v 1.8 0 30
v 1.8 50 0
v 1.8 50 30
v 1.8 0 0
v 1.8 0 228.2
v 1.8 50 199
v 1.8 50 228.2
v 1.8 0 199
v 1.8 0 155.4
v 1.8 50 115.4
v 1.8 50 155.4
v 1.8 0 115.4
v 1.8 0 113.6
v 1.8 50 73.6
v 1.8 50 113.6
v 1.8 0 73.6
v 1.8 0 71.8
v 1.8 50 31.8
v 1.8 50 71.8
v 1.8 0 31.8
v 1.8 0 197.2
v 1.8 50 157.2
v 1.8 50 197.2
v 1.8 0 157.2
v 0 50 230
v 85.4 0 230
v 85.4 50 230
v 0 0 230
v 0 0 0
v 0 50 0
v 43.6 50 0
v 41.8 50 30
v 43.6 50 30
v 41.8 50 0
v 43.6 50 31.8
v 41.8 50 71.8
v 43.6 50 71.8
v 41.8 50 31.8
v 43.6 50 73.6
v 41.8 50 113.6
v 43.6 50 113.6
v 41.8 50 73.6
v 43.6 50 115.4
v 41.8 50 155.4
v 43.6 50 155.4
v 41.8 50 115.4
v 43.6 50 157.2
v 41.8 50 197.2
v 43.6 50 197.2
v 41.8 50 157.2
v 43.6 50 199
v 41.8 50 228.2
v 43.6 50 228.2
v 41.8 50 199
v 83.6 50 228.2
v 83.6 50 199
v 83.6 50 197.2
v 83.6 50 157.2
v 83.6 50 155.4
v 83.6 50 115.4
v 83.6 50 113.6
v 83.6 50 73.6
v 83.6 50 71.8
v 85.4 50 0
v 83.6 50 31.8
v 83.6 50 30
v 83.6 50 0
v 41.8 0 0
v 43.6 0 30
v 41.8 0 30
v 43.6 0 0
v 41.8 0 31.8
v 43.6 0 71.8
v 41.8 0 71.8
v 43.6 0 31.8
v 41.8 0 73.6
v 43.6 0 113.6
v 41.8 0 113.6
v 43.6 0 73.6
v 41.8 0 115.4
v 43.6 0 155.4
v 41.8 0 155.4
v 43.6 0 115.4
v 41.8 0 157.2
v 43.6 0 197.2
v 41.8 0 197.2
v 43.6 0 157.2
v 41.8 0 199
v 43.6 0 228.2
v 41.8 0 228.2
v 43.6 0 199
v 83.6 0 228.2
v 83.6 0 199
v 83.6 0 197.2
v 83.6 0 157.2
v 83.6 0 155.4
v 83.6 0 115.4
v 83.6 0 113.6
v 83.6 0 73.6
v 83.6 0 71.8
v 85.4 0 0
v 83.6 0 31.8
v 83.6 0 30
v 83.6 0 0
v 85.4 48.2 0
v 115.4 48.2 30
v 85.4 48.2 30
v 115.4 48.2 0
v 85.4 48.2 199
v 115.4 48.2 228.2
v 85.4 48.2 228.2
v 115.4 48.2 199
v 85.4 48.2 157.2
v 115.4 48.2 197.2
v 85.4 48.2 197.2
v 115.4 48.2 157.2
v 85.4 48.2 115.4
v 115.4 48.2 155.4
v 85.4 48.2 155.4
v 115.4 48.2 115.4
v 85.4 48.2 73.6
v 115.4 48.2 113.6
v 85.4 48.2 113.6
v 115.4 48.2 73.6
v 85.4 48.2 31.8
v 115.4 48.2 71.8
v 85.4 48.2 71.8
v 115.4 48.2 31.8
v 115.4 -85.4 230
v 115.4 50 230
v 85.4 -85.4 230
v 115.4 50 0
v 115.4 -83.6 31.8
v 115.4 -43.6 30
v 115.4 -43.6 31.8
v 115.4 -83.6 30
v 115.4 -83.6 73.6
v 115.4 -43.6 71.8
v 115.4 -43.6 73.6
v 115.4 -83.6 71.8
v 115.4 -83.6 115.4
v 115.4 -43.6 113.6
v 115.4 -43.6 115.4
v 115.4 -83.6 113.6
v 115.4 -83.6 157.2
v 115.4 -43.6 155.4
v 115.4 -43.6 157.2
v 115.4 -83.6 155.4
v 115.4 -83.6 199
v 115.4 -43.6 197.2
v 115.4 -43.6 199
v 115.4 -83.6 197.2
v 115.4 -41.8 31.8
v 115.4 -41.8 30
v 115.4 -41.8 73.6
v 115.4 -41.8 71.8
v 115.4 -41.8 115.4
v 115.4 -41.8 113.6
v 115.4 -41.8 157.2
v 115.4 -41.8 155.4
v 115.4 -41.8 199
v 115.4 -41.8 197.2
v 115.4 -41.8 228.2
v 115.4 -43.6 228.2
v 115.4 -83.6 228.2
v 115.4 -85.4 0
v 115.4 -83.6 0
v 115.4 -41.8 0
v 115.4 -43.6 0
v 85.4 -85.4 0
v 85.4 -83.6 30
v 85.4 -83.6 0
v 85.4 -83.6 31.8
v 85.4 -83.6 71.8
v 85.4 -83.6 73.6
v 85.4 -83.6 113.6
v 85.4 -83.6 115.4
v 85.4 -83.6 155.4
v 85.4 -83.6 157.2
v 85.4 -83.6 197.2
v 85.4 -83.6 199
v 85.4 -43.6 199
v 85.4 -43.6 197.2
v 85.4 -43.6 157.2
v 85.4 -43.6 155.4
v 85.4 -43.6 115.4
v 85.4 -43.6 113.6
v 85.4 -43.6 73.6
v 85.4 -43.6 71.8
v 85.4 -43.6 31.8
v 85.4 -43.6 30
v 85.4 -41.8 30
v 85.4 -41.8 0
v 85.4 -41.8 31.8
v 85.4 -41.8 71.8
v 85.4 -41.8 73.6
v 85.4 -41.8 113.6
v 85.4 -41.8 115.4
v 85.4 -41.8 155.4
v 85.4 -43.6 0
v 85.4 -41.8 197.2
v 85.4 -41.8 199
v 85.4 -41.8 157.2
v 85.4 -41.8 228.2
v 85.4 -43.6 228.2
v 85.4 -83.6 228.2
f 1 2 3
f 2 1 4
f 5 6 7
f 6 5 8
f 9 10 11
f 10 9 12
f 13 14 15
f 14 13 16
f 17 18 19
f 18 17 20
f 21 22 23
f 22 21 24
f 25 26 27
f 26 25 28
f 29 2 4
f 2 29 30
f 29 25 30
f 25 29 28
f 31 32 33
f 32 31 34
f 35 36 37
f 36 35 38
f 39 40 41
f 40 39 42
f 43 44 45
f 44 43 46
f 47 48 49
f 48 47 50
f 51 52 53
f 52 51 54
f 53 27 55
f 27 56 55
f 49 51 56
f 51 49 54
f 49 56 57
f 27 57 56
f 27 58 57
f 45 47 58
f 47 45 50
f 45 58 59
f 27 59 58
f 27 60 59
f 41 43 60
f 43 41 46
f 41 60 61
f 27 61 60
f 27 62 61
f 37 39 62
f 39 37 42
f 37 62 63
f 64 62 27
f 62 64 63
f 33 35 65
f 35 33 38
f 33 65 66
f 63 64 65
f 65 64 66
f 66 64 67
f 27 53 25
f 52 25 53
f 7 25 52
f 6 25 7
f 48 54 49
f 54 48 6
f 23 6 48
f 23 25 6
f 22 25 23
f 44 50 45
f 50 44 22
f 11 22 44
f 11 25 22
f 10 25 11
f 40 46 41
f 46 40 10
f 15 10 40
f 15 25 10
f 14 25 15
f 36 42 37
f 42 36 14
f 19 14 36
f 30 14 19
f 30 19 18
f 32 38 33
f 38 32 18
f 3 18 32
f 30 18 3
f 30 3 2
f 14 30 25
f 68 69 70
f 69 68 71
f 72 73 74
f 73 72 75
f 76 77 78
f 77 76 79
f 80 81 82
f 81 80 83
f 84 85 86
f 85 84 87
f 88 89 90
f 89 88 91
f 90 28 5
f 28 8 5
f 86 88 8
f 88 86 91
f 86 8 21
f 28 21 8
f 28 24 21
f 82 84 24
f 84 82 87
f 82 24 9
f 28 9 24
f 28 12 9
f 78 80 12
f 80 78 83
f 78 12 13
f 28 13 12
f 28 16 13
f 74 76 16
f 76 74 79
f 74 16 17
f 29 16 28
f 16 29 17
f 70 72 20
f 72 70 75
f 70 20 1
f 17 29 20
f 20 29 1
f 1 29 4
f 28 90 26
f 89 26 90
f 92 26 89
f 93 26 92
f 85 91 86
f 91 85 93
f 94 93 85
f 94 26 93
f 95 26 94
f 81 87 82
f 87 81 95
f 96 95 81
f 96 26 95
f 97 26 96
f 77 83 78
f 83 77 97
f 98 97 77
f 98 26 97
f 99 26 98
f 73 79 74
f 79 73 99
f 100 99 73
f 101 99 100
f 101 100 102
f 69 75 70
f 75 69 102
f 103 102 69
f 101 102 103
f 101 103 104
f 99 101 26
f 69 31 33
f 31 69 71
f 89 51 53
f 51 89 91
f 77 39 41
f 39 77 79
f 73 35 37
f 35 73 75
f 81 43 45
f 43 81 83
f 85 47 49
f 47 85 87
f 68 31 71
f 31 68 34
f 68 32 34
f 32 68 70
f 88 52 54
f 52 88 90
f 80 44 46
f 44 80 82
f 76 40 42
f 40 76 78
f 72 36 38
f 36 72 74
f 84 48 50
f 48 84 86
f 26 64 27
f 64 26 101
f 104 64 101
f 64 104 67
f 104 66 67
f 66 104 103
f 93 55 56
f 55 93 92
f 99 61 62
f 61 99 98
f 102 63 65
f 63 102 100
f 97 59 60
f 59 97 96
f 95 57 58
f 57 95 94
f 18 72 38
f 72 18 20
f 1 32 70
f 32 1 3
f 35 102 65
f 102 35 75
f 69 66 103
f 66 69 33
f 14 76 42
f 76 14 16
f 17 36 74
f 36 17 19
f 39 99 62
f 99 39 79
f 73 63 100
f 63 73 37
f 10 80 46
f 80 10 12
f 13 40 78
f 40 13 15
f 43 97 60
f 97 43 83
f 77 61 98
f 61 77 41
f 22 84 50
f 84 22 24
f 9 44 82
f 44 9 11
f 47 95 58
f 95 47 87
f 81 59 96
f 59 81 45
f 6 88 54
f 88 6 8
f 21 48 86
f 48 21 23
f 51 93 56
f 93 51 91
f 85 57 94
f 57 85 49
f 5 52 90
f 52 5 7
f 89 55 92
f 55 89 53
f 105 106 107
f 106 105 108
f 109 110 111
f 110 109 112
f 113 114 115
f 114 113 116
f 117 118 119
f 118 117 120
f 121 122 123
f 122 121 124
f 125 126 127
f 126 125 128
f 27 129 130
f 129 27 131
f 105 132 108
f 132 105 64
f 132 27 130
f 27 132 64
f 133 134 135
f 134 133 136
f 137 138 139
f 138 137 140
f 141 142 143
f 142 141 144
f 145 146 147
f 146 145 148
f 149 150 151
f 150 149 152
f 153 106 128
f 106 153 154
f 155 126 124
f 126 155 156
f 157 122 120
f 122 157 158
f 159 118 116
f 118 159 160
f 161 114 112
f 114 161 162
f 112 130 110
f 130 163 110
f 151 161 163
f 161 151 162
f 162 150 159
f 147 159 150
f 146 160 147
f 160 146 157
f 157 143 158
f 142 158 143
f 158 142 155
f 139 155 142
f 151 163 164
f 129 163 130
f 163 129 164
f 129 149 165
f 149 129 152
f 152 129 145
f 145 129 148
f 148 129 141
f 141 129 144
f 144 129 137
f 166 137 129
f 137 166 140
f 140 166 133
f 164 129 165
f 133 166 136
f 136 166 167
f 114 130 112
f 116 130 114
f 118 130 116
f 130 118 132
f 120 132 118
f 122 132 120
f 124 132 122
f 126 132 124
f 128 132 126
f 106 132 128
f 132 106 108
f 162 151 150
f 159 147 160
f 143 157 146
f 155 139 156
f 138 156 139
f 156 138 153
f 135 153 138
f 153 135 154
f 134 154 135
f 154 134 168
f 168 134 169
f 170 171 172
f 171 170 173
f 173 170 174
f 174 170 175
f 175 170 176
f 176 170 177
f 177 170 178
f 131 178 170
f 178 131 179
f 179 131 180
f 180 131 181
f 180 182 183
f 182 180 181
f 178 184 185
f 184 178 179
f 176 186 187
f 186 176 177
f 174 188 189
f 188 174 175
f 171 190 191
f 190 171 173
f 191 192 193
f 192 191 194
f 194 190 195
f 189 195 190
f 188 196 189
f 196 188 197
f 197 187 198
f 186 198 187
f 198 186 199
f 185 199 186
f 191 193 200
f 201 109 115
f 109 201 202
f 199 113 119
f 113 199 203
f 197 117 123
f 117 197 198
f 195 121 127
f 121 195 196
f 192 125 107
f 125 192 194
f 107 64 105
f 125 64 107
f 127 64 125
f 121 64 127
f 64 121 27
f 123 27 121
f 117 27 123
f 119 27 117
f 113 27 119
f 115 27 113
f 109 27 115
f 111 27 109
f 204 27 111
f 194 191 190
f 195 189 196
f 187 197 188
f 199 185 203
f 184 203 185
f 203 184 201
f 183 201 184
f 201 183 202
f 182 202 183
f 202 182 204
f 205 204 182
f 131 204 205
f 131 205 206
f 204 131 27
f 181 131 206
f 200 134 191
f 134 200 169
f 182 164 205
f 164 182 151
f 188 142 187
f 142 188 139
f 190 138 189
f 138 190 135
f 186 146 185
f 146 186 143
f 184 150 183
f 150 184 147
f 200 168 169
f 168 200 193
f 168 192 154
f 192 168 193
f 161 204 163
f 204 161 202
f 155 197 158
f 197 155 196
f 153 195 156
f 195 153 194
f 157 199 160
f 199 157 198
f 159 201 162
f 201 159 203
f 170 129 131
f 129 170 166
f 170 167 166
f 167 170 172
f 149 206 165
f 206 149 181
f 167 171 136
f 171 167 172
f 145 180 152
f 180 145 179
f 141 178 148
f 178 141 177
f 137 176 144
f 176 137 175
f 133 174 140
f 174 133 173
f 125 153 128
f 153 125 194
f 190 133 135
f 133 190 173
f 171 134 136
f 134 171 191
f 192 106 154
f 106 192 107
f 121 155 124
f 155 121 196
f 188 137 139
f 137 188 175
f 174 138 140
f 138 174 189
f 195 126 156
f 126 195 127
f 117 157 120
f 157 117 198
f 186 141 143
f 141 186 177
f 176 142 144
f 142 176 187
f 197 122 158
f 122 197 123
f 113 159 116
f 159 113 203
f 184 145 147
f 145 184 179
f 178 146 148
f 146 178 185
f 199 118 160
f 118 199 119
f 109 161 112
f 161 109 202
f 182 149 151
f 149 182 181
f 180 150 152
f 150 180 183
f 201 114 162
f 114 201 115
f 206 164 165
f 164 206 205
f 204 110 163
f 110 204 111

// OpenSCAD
$fs=0.25;$fa=6;
color([0,1,0.251])union() {
union() {
union() {
translate([0.9,25,115])cube([1.8,50,230],center=true);
translate([42.7,25,115])cube([1.8,50,230],center=true);
translate([84.5,25,115])cube([1.8,50,230],center=true);
}
translate([42.7,25,229.1])cube([85.4,50,1.8],center=true);
union() {
translate([21.8,25,30.9])cube([40,50,1.8],center=true);
translate([63.6,25,30.9])cube([40,50,1.8],center=true);
translate([21.8,25,72.7])cube([40,50,1.8],center=true);
translate([63.6,25,72.7])cube([40,50,1.8],center=true);
translate([21.8,25,114.5])cube([40,50,1.8],center=true);
translate([63.6,25,114.5])cube([40,50,1.8],center=true);
translate([21.8,25,156.3])cube([40,50,1.8],center=true);
translate([63.6,25,156.3])cube([40,50,1.8],center=true);
translate([21.8,25,198.1])cube([40,50,1.8],center=true);
translate([63.6,25,198.1])cube([40,50,1.8],center=true);
}
}
translate([85.4,50,0])rotate([0,0,-90])union() {
union() {
translate([0.9,15,115])cube([1.8,30,230],center=true);
translate([92.7,15,115])cube([1.8,30,230],center=true);
translate([134.5,15,115])cube([1.8,30,230],center=true);
}
translate([66.8,15,229.1])cube([133.6,30,1.8],center=true);
union() {
translate([67.7,15,30.9])cube([131.8,30,1.8],center=true);
translate([67.7,15,72.7])cube([131.8,30,1.8],center=true);
translate([67.7,15,114.5])cube([131.8,30,1.8],center=true);
translate([67.7,15,156.3])cube([131.8,30,1.8],center=true);
translate([67.7,15,198.1])cube([131.8,30,1.8],center=true);
}
}
}
